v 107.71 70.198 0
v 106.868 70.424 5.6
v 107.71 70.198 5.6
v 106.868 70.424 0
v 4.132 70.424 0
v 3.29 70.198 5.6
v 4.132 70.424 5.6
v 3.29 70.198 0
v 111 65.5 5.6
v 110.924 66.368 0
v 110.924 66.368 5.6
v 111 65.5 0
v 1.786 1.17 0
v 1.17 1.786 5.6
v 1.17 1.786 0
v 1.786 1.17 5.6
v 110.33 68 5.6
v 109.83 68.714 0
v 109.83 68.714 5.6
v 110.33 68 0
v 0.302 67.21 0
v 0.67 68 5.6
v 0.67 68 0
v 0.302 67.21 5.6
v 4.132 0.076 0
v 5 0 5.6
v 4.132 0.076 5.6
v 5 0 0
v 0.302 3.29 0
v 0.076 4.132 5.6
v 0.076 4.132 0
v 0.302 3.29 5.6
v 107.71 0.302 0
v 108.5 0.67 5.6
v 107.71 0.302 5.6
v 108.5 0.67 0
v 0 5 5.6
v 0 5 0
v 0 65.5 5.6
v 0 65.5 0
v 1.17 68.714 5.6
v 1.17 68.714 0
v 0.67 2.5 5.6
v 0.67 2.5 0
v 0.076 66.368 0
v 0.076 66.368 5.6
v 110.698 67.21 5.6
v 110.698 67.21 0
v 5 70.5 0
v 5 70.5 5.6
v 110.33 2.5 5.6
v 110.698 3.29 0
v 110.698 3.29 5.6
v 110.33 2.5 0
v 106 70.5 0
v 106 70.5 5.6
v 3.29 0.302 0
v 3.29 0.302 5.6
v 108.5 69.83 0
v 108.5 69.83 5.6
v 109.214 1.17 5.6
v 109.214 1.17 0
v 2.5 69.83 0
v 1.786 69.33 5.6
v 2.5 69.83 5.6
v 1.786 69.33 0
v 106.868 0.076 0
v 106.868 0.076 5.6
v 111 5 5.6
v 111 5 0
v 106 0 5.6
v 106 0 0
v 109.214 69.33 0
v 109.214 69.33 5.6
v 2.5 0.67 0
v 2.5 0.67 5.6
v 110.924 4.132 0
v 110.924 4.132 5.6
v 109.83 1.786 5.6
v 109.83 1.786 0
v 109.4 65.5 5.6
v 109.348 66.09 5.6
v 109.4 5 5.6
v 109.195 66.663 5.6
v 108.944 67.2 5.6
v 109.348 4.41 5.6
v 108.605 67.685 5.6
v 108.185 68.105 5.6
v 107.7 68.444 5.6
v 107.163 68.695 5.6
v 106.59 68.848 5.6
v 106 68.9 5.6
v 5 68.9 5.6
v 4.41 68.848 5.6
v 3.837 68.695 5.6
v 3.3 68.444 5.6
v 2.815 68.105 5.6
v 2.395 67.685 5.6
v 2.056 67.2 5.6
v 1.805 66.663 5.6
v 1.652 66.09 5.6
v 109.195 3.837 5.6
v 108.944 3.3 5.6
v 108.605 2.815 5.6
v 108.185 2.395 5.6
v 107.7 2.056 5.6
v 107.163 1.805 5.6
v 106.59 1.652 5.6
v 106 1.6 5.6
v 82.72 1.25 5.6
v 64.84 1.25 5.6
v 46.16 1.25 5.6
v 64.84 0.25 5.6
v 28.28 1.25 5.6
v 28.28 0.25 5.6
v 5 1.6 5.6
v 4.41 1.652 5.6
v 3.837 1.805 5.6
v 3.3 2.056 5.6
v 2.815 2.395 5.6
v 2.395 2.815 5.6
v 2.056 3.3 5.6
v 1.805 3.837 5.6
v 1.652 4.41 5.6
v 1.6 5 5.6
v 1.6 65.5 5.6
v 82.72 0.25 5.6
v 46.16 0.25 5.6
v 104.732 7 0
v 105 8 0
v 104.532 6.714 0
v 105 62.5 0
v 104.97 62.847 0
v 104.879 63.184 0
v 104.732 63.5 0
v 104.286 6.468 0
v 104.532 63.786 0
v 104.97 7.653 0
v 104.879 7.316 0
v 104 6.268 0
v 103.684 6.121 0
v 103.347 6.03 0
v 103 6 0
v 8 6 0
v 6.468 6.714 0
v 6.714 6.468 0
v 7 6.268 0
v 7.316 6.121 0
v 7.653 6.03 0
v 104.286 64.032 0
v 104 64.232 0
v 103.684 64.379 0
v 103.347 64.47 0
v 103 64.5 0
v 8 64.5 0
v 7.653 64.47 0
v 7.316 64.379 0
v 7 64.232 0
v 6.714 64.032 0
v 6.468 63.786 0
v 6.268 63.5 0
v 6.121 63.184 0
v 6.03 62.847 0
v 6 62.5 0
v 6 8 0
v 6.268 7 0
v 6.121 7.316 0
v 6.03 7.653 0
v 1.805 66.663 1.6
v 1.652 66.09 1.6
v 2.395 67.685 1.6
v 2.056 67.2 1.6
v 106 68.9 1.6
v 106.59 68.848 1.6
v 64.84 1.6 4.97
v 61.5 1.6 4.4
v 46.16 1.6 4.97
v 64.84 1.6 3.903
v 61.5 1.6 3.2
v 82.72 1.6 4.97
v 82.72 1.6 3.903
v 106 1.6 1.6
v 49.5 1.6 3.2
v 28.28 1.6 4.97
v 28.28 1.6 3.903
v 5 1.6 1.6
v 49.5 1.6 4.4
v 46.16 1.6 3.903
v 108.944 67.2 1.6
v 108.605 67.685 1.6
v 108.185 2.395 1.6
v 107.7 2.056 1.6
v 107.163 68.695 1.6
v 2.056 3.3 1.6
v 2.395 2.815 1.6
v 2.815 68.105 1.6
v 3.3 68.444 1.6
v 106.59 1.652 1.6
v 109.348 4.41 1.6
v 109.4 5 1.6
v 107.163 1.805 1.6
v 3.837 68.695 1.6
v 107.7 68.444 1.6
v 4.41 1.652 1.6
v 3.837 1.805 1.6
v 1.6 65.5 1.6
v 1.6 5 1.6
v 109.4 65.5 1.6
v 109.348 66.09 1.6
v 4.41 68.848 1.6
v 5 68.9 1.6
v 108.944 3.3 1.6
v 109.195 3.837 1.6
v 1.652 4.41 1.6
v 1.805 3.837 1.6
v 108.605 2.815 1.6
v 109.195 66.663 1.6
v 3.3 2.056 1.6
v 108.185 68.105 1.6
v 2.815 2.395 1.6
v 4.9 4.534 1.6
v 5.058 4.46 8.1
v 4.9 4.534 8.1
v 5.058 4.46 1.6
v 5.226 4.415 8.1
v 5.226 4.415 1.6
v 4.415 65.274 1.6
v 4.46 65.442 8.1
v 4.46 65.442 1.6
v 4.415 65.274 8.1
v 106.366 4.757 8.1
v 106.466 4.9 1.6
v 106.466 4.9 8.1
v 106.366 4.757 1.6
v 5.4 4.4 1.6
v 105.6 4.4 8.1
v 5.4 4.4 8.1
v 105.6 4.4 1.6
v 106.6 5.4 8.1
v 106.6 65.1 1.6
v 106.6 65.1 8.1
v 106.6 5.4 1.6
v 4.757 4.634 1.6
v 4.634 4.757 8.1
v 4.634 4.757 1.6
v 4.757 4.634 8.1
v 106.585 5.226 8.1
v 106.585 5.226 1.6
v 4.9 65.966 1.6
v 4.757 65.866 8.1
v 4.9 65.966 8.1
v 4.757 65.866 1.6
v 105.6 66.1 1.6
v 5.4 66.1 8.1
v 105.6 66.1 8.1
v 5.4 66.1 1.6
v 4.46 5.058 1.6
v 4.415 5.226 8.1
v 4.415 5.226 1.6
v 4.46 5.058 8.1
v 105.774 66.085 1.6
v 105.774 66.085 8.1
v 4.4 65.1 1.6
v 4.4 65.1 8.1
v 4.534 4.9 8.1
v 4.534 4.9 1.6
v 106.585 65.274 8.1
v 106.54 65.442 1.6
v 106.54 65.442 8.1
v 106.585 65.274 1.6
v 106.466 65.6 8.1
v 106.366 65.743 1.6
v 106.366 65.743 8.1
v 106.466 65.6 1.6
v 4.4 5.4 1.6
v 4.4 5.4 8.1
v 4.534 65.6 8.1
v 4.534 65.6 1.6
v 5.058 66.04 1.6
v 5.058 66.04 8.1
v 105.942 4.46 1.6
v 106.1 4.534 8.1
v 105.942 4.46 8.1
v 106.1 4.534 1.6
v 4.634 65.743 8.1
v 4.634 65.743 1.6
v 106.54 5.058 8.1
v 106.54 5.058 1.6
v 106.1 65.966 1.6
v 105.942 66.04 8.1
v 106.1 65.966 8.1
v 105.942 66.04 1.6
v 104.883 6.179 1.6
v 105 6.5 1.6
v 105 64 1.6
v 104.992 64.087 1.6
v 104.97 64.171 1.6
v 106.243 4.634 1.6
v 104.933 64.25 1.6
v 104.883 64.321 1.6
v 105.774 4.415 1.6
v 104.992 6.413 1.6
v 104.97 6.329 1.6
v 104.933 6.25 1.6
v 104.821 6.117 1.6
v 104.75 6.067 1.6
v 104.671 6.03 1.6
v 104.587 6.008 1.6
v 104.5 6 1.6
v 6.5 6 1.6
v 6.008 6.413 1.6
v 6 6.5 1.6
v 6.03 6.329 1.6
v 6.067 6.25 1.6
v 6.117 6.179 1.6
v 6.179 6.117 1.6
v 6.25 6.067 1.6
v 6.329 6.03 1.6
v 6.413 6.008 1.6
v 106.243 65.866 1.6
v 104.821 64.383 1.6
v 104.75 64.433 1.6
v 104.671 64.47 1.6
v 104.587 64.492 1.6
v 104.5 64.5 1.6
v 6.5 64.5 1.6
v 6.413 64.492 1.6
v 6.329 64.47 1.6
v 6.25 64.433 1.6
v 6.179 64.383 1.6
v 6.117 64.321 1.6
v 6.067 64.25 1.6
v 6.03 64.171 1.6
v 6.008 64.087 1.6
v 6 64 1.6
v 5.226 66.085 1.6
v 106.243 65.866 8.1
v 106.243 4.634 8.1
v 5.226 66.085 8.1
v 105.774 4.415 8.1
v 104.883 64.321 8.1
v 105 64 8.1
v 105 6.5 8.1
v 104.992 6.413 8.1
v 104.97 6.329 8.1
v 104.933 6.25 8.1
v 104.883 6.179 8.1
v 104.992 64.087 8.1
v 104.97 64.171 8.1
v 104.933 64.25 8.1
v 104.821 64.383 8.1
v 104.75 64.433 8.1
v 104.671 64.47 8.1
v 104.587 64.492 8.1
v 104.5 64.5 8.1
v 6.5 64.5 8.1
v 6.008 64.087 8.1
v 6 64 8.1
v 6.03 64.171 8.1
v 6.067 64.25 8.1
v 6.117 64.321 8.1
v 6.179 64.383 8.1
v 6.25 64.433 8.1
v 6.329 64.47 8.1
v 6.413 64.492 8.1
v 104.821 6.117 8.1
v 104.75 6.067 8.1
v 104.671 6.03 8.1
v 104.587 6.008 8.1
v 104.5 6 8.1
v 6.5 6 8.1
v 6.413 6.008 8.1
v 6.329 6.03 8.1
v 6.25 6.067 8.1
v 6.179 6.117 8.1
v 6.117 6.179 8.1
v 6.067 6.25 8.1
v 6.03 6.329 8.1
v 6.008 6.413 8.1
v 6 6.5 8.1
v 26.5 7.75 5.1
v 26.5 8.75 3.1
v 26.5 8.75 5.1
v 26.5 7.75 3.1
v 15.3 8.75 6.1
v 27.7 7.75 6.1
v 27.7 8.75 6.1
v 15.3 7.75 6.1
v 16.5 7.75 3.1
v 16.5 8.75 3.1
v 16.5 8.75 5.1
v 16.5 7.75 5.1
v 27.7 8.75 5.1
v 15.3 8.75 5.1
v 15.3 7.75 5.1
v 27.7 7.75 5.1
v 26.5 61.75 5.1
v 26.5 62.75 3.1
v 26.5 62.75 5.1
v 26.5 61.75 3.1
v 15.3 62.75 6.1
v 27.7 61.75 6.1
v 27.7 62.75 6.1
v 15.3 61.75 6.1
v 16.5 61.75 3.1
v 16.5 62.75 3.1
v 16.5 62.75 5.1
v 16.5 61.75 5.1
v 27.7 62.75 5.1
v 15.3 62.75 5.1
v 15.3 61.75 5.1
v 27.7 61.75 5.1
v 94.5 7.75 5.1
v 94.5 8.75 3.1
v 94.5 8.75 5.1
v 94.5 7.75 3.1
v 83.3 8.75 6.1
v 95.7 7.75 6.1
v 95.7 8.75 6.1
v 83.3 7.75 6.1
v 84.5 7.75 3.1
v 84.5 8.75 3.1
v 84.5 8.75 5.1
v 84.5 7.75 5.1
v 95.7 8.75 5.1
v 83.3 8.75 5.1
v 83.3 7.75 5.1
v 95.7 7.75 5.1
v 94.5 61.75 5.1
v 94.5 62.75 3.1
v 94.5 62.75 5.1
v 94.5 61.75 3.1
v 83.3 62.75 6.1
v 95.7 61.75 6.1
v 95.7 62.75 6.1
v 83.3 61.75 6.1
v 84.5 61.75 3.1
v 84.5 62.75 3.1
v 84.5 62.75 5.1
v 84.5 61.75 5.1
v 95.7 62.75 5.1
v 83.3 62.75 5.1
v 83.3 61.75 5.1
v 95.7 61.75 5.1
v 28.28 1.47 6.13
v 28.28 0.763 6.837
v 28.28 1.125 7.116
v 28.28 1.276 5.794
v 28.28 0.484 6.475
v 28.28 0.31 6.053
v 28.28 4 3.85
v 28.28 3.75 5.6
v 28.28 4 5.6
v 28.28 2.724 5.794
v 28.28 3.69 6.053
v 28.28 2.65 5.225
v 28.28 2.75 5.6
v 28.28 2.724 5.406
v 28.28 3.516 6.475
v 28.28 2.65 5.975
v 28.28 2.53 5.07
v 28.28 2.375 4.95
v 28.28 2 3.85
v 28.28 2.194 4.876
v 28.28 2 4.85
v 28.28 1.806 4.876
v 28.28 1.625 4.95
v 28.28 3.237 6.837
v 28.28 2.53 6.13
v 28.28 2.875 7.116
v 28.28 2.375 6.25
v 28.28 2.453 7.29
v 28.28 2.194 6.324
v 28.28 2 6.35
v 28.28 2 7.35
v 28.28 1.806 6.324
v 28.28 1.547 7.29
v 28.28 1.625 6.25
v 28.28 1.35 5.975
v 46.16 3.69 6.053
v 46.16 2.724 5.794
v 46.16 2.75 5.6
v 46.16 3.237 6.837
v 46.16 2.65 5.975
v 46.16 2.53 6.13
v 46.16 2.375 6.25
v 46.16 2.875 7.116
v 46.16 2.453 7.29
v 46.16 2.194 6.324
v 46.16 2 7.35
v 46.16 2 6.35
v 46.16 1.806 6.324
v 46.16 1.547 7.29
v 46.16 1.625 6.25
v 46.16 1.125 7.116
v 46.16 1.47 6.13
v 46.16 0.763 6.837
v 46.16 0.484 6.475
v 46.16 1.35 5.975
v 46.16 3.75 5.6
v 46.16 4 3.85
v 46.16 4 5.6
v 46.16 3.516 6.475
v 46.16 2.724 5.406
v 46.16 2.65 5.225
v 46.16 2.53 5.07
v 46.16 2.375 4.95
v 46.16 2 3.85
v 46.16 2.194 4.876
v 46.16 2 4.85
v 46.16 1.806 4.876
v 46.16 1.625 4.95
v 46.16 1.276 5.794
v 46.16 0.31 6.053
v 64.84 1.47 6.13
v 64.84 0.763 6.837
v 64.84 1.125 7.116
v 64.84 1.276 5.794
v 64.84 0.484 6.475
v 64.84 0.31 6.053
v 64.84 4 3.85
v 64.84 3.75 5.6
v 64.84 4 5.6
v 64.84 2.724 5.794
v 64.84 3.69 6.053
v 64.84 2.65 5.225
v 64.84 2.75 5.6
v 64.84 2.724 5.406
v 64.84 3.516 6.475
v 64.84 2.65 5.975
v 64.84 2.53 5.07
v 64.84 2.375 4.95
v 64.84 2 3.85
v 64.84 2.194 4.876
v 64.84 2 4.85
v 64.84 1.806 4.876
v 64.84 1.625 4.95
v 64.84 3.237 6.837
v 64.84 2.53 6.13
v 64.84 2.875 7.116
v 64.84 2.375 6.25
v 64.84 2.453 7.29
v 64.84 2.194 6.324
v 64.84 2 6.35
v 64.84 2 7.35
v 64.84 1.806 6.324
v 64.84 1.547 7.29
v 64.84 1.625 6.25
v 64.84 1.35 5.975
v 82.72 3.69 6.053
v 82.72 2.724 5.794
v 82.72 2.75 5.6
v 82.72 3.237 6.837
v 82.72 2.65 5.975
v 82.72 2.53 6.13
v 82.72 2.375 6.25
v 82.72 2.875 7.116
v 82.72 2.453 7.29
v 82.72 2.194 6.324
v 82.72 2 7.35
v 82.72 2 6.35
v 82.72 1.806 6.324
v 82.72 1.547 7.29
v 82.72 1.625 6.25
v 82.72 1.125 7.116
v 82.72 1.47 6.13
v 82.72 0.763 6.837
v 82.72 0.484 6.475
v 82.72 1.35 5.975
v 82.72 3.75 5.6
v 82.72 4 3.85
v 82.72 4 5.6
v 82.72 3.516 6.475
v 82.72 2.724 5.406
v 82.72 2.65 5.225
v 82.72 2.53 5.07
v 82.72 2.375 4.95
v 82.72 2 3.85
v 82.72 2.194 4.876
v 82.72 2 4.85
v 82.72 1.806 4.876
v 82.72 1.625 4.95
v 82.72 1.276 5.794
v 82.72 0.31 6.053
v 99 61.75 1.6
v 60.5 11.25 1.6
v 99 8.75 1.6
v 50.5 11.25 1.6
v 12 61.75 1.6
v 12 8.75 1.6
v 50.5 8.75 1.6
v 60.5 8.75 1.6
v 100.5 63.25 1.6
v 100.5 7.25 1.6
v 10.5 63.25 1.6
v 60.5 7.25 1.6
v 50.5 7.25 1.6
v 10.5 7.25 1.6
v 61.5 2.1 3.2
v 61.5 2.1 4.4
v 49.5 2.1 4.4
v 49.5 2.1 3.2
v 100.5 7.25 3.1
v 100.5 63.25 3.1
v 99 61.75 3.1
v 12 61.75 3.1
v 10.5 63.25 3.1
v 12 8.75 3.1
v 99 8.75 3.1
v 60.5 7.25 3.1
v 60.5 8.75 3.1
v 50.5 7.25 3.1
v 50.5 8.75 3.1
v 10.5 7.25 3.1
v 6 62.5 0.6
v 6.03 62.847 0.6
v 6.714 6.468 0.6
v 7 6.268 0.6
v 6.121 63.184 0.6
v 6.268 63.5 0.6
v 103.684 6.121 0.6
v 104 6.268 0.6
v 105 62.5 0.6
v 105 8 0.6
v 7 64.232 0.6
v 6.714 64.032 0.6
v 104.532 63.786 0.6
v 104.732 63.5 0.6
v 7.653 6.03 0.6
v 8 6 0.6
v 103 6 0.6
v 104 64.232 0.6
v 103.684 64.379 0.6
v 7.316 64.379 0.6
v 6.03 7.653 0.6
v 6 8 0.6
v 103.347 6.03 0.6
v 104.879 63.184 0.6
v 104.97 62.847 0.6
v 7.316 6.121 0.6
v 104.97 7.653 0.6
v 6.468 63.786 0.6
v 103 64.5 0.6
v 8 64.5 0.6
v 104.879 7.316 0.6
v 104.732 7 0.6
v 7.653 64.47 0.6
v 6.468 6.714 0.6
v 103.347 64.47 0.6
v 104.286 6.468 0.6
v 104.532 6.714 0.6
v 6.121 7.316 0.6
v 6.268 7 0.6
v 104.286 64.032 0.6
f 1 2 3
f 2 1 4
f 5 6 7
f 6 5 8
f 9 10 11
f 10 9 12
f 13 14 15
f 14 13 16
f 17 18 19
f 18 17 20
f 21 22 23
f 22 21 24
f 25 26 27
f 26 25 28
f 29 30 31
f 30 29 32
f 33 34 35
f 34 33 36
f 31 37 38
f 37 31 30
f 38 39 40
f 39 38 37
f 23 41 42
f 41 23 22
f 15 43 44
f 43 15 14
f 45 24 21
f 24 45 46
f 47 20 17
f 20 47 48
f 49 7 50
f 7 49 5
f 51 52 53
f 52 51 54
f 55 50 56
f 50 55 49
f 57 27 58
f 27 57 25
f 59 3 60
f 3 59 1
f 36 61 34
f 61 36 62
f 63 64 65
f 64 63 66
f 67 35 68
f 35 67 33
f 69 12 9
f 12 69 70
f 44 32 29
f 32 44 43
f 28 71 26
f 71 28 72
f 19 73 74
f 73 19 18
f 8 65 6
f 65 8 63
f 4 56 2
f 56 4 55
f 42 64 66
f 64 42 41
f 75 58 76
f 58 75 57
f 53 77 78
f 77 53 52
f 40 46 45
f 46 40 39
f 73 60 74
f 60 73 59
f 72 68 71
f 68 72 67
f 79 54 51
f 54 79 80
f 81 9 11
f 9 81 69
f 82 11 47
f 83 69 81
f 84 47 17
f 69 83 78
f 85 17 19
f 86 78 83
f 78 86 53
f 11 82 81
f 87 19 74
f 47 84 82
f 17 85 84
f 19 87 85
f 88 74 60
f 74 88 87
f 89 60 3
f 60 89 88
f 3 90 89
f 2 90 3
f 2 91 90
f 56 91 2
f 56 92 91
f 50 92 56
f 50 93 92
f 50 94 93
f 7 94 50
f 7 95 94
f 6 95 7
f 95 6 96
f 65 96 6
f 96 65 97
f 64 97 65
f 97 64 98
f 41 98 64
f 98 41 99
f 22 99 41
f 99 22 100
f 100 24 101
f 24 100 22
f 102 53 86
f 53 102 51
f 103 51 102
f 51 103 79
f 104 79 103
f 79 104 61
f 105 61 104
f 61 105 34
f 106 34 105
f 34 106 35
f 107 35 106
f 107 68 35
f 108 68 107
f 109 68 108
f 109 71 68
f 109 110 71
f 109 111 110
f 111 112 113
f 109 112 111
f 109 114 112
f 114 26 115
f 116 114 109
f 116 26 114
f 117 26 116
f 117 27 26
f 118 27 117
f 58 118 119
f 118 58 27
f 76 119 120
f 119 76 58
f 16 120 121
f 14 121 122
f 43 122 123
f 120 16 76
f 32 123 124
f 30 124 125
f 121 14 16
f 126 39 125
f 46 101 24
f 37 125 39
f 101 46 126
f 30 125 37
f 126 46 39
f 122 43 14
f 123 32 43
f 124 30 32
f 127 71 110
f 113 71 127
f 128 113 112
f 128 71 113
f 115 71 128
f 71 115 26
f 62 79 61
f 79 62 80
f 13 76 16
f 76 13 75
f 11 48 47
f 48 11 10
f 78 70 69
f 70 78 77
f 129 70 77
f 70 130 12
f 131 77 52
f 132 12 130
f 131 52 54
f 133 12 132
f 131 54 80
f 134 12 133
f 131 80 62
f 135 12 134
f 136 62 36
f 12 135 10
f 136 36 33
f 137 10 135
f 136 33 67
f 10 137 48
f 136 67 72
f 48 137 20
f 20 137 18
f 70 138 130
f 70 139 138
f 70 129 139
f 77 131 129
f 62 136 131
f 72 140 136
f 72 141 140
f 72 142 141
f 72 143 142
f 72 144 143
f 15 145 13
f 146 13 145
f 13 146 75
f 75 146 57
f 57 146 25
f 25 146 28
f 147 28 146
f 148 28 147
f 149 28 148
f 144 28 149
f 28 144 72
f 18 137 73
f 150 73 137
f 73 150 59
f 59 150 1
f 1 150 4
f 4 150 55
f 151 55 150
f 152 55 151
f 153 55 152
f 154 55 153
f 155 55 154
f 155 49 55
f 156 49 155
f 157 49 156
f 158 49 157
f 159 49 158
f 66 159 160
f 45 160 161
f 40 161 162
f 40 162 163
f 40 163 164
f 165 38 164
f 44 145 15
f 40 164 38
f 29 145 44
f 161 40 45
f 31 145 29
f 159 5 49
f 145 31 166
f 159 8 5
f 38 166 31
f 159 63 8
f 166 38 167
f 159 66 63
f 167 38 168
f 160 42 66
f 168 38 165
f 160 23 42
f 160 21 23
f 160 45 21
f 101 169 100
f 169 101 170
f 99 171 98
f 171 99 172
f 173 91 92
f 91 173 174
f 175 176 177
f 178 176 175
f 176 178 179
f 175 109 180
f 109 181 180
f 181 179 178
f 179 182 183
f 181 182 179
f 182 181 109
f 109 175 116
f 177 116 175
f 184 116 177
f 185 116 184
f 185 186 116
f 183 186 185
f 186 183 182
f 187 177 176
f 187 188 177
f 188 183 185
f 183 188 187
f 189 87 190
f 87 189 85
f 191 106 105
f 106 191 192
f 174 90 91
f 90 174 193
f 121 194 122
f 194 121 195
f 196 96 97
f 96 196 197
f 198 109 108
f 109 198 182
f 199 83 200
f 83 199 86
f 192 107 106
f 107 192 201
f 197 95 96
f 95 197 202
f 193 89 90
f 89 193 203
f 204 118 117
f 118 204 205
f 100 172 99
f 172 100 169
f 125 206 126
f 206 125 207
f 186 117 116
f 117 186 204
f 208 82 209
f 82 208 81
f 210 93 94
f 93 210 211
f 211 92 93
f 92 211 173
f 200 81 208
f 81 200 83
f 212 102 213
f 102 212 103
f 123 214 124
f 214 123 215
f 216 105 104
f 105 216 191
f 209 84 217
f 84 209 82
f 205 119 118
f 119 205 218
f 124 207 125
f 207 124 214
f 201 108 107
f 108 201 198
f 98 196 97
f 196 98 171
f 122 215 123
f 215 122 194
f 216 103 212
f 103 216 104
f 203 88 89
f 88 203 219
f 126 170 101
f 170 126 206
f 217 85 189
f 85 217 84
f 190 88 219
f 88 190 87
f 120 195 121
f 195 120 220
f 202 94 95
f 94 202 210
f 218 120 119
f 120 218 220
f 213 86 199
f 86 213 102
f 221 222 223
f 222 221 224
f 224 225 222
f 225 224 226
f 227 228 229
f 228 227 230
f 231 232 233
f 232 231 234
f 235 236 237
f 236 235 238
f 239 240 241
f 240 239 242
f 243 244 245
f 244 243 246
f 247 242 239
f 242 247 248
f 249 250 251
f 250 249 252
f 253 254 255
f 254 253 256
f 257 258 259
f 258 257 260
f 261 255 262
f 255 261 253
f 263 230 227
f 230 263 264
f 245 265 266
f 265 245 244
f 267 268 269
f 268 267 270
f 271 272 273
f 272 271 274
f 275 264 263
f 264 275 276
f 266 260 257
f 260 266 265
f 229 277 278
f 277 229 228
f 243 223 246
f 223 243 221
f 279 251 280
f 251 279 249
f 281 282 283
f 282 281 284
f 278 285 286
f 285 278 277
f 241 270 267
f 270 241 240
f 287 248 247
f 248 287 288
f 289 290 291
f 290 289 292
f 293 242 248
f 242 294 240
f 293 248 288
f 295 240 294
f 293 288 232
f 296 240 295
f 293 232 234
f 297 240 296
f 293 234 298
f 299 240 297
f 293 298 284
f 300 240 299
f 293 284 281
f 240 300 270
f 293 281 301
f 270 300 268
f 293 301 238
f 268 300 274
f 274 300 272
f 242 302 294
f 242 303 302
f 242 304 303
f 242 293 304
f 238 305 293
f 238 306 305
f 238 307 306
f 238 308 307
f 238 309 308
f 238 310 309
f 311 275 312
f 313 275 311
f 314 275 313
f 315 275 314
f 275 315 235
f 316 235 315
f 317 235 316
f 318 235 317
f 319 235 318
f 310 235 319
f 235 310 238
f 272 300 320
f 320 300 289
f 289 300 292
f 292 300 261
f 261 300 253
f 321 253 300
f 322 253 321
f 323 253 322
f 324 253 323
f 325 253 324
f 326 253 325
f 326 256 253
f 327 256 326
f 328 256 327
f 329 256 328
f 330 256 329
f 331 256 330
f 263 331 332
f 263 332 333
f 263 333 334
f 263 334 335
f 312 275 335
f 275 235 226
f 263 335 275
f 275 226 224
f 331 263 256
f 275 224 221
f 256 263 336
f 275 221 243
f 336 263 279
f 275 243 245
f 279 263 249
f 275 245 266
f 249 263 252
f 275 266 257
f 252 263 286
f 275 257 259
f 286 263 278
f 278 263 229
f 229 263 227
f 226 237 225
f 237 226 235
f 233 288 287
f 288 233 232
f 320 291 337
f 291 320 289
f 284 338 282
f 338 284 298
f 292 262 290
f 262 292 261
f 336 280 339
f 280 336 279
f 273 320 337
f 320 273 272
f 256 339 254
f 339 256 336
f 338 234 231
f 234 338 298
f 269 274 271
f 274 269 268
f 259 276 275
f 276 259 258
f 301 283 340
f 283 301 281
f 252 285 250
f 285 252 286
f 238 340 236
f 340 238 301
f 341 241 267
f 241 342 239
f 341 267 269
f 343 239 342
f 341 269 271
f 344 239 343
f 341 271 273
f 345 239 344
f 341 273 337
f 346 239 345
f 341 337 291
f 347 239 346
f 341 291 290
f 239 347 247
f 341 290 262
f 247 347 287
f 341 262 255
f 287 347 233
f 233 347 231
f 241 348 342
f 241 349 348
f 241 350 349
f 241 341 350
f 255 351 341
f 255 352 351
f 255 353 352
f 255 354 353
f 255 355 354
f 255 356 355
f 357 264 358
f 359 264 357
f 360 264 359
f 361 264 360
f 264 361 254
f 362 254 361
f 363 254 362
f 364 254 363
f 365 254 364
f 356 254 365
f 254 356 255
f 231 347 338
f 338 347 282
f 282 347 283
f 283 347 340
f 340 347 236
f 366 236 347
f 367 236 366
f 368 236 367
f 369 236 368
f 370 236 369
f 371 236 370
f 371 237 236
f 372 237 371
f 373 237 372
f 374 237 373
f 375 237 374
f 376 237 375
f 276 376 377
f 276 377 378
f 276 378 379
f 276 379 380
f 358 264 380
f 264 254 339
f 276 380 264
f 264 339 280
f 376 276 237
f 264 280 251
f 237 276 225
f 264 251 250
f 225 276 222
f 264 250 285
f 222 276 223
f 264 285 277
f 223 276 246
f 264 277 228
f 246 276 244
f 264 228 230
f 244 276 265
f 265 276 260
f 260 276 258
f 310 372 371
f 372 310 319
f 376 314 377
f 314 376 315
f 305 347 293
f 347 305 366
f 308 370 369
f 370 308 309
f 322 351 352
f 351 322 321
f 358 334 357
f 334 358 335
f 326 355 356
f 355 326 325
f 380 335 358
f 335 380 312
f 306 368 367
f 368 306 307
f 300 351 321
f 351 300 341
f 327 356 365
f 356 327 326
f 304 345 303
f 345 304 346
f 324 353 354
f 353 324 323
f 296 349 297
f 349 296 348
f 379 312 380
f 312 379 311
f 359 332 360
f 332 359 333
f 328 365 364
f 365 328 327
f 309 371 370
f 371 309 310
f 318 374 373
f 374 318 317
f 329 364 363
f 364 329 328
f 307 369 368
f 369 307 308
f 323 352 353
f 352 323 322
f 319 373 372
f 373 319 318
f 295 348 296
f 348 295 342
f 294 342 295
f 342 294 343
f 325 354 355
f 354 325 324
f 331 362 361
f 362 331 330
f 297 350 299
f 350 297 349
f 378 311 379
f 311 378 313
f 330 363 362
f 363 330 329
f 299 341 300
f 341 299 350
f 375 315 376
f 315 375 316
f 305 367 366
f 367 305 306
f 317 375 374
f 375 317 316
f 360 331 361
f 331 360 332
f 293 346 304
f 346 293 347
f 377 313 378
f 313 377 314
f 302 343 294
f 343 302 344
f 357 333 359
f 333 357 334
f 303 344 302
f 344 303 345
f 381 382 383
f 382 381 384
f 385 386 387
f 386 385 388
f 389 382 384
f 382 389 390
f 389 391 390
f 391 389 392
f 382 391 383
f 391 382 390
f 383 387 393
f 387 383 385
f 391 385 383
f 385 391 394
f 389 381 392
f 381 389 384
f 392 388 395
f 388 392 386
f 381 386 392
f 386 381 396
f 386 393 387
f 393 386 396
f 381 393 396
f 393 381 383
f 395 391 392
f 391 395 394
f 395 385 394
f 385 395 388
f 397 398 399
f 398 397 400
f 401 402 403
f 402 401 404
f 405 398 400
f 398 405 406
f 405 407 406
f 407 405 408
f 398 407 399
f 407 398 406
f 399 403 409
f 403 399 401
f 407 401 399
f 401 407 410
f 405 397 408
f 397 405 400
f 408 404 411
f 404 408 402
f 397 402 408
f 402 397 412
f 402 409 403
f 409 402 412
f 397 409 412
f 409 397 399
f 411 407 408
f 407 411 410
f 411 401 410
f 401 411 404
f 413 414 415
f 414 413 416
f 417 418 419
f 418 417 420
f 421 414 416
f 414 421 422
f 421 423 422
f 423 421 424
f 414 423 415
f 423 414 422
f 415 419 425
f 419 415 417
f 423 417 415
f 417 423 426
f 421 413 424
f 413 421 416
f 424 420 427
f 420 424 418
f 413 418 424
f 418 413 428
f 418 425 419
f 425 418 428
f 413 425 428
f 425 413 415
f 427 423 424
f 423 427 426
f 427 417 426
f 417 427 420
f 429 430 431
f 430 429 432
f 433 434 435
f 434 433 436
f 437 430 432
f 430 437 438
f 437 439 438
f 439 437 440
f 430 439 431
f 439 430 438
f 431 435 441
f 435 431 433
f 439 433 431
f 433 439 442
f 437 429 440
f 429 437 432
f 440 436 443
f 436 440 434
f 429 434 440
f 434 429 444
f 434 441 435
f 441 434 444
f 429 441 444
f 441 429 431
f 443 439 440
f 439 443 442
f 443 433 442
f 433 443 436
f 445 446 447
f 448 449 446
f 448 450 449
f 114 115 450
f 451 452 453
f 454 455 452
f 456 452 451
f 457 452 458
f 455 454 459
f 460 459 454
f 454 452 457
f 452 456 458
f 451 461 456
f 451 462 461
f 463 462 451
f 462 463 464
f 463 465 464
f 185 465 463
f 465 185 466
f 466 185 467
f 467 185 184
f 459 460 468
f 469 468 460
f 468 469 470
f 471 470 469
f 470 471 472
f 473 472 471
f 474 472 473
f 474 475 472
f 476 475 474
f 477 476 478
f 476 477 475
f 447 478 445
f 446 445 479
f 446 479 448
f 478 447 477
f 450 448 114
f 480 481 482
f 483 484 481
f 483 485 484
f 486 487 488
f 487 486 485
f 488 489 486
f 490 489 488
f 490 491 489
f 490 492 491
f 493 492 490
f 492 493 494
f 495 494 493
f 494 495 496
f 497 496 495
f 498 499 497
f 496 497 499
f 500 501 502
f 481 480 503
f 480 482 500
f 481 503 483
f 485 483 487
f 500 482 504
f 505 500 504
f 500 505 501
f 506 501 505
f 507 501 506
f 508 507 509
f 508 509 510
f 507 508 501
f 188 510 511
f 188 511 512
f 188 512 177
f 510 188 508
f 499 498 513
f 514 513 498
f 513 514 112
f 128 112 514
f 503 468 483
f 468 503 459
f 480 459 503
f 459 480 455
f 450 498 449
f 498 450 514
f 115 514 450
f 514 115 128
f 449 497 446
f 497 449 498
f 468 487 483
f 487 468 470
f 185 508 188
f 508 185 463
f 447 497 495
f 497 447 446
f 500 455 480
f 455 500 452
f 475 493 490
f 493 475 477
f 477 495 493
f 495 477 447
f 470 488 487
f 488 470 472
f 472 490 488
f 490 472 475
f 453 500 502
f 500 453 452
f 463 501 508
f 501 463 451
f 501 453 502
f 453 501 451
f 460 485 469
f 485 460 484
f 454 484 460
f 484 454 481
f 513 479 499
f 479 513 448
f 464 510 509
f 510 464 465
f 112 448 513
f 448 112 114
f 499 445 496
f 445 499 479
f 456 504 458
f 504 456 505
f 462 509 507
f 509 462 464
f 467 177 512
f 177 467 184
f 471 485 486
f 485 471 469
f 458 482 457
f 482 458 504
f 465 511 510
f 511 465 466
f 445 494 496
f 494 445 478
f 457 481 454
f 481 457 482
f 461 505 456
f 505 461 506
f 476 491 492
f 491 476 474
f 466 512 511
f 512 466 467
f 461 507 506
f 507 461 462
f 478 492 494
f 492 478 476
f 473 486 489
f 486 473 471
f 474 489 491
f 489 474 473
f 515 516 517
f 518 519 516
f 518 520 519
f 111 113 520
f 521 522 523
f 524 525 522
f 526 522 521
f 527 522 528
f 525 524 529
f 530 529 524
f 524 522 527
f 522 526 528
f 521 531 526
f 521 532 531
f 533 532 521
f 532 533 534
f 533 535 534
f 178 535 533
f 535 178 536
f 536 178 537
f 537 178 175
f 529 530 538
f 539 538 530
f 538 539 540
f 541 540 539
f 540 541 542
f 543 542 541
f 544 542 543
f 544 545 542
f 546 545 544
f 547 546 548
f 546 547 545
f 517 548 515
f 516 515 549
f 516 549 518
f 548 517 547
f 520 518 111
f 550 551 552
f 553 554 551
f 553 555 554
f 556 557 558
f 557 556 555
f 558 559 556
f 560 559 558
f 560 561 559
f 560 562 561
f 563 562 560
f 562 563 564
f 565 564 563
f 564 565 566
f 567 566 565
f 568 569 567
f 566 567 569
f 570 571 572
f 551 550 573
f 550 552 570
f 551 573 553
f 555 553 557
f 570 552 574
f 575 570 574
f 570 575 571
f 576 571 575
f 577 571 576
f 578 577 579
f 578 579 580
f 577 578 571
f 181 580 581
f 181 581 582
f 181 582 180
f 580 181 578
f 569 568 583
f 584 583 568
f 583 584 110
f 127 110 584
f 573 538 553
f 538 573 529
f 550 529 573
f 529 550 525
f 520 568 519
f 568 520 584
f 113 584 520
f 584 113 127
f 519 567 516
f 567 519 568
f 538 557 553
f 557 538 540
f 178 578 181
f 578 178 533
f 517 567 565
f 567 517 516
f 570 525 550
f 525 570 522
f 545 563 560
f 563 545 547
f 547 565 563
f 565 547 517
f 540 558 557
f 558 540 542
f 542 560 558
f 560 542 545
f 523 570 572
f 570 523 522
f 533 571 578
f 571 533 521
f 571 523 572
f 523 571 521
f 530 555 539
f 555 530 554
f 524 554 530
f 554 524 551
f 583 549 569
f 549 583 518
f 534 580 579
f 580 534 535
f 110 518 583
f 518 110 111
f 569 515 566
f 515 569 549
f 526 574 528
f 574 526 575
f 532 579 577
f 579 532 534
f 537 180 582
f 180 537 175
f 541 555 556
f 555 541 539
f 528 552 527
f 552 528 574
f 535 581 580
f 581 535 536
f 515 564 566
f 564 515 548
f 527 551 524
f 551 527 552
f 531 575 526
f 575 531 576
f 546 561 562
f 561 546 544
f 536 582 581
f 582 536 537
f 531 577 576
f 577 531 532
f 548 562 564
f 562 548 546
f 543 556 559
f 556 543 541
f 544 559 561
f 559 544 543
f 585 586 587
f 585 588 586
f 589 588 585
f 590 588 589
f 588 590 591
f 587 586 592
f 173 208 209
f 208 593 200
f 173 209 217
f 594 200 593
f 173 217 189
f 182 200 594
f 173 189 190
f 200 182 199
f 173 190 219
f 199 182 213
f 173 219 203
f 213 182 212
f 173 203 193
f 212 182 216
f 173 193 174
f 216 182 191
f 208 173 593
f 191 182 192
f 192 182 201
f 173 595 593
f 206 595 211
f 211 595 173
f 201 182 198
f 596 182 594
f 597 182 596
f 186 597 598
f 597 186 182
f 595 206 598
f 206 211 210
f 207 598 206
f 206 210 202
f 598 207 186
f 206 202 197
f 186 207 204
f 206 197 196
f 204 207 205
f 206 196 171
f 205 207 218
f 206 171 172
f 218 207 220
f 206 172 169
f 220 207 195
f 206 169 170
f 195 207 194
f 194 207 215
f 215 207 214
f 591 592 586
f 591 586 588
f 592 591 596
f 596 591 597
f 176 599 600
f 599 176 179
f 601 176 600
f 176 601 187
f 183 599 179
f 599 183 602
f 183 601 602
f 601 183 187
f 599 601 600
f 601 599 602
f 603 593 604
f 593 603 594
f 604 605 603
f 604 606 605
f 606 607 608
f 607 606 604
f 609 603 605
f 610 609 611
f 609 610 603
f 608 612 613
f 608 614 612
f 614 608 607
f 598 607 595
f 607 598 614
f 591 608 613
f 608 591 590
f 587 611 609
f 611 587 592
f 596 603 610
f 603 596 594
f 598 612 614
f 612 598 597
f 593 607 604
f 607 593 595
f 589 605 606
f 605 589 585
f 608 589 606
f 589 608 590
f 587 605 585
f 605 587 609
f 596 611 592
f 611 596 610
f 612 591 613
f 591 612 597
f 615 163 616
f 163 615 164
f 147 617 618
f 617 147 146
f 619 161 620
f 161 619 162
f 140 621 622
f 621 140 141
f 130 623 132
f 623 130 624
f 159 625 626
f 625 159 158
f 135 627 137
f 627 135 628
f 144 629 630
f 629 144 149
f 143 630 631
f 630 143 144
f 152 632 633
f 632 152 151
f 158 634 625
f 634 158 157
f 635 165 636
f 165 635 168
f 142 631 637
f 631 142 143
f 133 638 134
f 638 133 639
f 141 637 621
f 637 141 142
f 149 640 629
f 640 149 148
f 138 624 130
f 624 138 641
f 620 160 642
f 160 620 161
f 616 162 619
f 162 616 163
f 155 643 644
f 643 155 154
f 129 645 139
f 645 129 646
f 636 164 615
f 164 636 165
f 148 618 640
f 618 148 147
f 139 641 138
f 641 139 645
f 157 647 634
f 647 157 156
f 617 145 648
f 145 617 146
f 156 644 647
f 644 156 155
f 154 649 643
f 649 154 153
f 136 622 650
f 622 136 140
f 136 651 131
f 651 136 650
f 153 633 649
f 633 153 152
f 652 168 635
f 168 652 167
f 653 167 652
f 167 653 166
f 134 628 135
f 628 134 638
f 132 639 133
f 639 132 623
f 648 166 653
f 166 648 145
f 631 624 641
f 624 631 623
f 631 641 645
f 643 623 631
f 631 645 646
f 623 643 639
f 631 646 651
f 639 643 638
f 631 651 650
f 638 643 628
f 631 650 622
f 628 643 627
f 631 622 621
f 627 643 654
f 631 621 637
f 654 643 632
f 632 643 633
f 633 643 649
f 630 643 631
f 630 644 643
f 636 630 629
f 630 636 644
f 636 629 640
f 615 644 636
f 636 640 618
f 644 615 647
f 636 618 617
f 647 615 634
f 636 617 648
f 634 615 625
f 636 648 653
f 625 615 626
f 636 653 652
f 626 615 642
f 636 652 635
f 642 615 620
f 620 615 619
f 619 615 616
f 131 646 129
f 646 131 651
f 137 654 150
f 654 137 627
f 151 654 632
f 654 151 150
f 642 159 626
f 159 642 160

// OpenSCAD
// =============================================================================
// Altoids Mesh Enclosure — Top Lid
// =============================================================================
// Overlapping lid that slides over the bottom-case walls — just like a
// real Altoids tin.  Houses the CardKB keyboard and has an OLED display
// window.
//
// Features:  overlapping skirt · embossed label panel · friction-fit
//            bump at front edge · CardKB mounting ledges & retention
//            clips · hinge knuckles (paper-clip pin)
//
// Sealed design: no through-holes in the top plate.  Keyboard and
// display are accessible only when the lid is hinged open (laptop mode).
// =============================================================================

include <parameters.scad>

// =========================================================================
//  Helper Modules
// =========================================================================

// Rounded rectangle (origin at corner, Z-up)
module rrect(size, r) {
    hull() {
        for (dx = [r, size[0] - r], dy = [r, size[1] - r])
            translate([dx, dy, 0])
                cylinder(r = r, h = size[2], $fn = 36);
    }
}

// CardKB retention clip
module cardkb_clip(len) {
    ch  = 3.0;   // clip height
    ct  = 1.0;   // clip thickness
    coh = 1.2;   // overhang
    cube([len, ct, ch]);
    translate([-coh, 0, ch - ct])
        cube([len + coh * 2, ct, ct]);
}

// ----- Lid Hinge Knuckle (lid side) ------------------------------------------
// In lid-local coordinates the hinge axis is at Y = 0, Z = lid_ext_depth
// (maps to the back-edge hinge axis when the lid is flipped in assembly).
module lid_hinge_knuckle(x_pos, klen) {
    barrel_r = hinge_barrel_d / 2;
    translate([x_pos, 0, lid_ext_depth]) {
        difference() {
            union() {
                rotate([0, 90, 0])
                    cylinder(d = hinge_barrel_d, h = klen, $fn = 24);
                // Arm toward lid body (+Y)
                translate([0, 0, -barrel_r])
                    cube([klen, hinge_arm_t, barrel_r]);
            }
            // Pin hole (paper-clip clearance)
            translate([-0.1, 0, 0])
                rotate([0, 90, 0])
                    cylinder(d = hinge_pin_d + tolerance * 2,
                             h = klen + 0.2, $fn = 24);
        }
    }
}

// =========================================================================
//  Main Top Lid
// =========================================================================
module top_lid() {
    // Offsets caused by the wider lid vs case
    lid_off = lid_wall + snap_clearance;   // extra width per side

    difference() {
        union() {
            // ----------------------------------------------------------
            //  Outer shell  (top plate + skirt walls)
            // ----------------------------------------------------------
            // Top plate at full lid footprint
            rrect([lid_ext_len, lid_ext_wid, lid_top_t],
                  corner_r + lid_off);

            // Skirt (short walls that slide over the case)
            difference() {
                rrect([lid_ext_len, lid_ext_wid, lid_top_t + lid_overlap],
                      corner_r + lid_off);
                // Hollow out the interior of the skirt
                translate([lid_wall, lid_wall, -0.1])
                    rrect([lid_ext_len - lid_wall * 2,
                           lid_ext_wid - lid_wall * 2,
                           lid_top_t + lid_overlap + 0.2],
                          corner_r + lid_off - lid_wall);
            }

            // Interior pocket walls (for CardKB recess depth)
            // Pocket must fit inside the case walls with clearance
            translate([lid_off + wall + snap_clearance,
                       lid_off + wall + snap_clearance, lid_top_t])
                difference() {
                    rrect([int_len - snap_clearance * 2,
                           int_wid - snap_clearance * 2,
                           lid_int_depth],
                          max(0.5, corner_r - wall));
                    translate([lid_wall, lid_wall, -0.1])
                        rrect([int_len - snap_clearance * 2 - lid_wall * 2,
                               int_wid - snap_clearance * 2 - lid_wall * 2,
                               lid_int_depth + 0.2],
                              max(0.5, corner_r - wall - lid_wall));
                }

            // ----------------------------------------------------------
            //  Friction-fit bump on front skirt (Altoids-style catch)
            // ----------------------------------------------------------
            translate([lid_ext_len / 2 - friction_bump_w / 2,
                       0,
                       lid_top_t + lid_overlap * 0.4])
                cube([friction_bump_w, lid_wall + friction_bump_h,
                      lid_overlap * 0.3]);

            // ----------------------------------------------------------
            //  CardKB support ledges  (1 mm clearance all around)
            // ----------------------------------------------------------
            kb_ledge_h = lid_int_depth - cardkb_ht;

            // Left ledge
            translate([lid_off + wall + cardkb_pos_x - 1.0,
                       lid_off + wall + cardkb_pos_y - 1.0,
                       lid_top_t])
                cube([cardkb_len + 2, 1.5, kb_ledge_h]);

            // Right ledge
            translate([lid_off + wall + cardkb_pos_x - 1.0,
                       lid_off + wall + cardkb_pos_y + cardkb_wid - 0.5,
                       lid_top_t])
                cube([cardkb_len + 2, 1.5, kb_ledge_h]);

            // Front ledge
            translate([lid_off + wall + cardkb_pos_x - 1.0,
                       lid_off + wall + cardkb_pos_y - 1.0,
                       lid_top_t])
                cube([1.5, cardkb_wid + 2, kb_ledge_h]);

            // Back ledge
            translate([lid_off + wall + cardkb_pos_x + cardkb_len - 0.5,
                       lid_off + wall + cardkb_pos_y - 1.0,
                       lid_top_t])
                cube([1.5, cardkb_wid + 2, kb_ledge_h]);

            // ----------------------------------------------------------
            //  CardKB retention clips (four corners)
            // ----------------------------------------------------------
            for (cx = [5, cardkb_len - 15])
                for (cy = [-0.5, cardkb_wid - 0.5])
                    translate([lid_off + wall + cardkb_pos_x + cx,
                               lid_off + wall + cardkb_pos_y + cy,
                               lid_top_t + kb_ledge_h])
                        cardkb_clip(10);

            // ----------------------------------------------------------
            //  Hinge knuckles  (lid gets knuckles 1, 3)
            // ----------------------------------------------------------
            // Shift by lid_off so knuckles align with case knuckles.
            // Y = lid_off maps to Y = case_ext_wid after assembly
            // (the 180° flip inverts Y).
            translate([lid_off, lid_off, 0])
            for (i = [1, 3]) {
                xp = hinge_margin + i * (hinge_knuckle_l + hinge_gap);
                barrel_r = hinge_barrel_d / 2;
                translate([xp, 0, lid_top_t + lid_overlap]) {
                    difference() {
                        union() {
                            rotate([0, 90, 0])
                                cylinder(d = hinge_barrel_d,
                                         h = hinge_knuckle_l, $fn = 24);
                            // Arm toward lid body (+Y local = toward
                            // case interior after 180° assembly flip)
                            translate([0, 0, -barrel_r])
                                cube([hinge_knuckle_l, hinge_arm_t,
                                      barrel_r]);
                        }
                        translate([-0.1, 0, 0])
                            rotate([0, 90, 0])
                                cylinder(d = hinge_pin_d + tolerance * 2,
                                         h = hinge_knuckle_l + 0.2,
                                         $fn = 24);
                    }
                }
            }
        }

        // ==============================================================
        //  Subtractive features
        // ==============================================================

        // NOTE: keyboard and display openings removed for sealed design.
        // Keys and OLED are accessible through the open lid pocket in
        // laptop mode; no through-holes in the top plate when closed.

        // CardKB cable routing slot
        translate([lid_off + wall + cardkb_pos_x
                       + cardkb_cable_off - cardkb_cable_w / 2 - 1,
                   lid_off + wall + cardkb_pos_y - 1,
                   lid_top_t])
            cube([cardkb_cable_w + 2, wall + 2, cardkb_ht + 2]);

        // Embossed label panel (shallow recess on lid top)
        translate([emboss_inset, emboss_inset, -0.1])
            rrect([lid_ext_len - emboss_inset * 2,
                   lid_ext_wid - emboss_inset * 2,
                   emboss_depth + 0.1],
                  emboss_r);

        // NOTE: corner screw holes removed for sealed design.
        // Lid closure relies on friction-fit bump + hinge.
    }
}

// Render when opened directly
top_lid();
